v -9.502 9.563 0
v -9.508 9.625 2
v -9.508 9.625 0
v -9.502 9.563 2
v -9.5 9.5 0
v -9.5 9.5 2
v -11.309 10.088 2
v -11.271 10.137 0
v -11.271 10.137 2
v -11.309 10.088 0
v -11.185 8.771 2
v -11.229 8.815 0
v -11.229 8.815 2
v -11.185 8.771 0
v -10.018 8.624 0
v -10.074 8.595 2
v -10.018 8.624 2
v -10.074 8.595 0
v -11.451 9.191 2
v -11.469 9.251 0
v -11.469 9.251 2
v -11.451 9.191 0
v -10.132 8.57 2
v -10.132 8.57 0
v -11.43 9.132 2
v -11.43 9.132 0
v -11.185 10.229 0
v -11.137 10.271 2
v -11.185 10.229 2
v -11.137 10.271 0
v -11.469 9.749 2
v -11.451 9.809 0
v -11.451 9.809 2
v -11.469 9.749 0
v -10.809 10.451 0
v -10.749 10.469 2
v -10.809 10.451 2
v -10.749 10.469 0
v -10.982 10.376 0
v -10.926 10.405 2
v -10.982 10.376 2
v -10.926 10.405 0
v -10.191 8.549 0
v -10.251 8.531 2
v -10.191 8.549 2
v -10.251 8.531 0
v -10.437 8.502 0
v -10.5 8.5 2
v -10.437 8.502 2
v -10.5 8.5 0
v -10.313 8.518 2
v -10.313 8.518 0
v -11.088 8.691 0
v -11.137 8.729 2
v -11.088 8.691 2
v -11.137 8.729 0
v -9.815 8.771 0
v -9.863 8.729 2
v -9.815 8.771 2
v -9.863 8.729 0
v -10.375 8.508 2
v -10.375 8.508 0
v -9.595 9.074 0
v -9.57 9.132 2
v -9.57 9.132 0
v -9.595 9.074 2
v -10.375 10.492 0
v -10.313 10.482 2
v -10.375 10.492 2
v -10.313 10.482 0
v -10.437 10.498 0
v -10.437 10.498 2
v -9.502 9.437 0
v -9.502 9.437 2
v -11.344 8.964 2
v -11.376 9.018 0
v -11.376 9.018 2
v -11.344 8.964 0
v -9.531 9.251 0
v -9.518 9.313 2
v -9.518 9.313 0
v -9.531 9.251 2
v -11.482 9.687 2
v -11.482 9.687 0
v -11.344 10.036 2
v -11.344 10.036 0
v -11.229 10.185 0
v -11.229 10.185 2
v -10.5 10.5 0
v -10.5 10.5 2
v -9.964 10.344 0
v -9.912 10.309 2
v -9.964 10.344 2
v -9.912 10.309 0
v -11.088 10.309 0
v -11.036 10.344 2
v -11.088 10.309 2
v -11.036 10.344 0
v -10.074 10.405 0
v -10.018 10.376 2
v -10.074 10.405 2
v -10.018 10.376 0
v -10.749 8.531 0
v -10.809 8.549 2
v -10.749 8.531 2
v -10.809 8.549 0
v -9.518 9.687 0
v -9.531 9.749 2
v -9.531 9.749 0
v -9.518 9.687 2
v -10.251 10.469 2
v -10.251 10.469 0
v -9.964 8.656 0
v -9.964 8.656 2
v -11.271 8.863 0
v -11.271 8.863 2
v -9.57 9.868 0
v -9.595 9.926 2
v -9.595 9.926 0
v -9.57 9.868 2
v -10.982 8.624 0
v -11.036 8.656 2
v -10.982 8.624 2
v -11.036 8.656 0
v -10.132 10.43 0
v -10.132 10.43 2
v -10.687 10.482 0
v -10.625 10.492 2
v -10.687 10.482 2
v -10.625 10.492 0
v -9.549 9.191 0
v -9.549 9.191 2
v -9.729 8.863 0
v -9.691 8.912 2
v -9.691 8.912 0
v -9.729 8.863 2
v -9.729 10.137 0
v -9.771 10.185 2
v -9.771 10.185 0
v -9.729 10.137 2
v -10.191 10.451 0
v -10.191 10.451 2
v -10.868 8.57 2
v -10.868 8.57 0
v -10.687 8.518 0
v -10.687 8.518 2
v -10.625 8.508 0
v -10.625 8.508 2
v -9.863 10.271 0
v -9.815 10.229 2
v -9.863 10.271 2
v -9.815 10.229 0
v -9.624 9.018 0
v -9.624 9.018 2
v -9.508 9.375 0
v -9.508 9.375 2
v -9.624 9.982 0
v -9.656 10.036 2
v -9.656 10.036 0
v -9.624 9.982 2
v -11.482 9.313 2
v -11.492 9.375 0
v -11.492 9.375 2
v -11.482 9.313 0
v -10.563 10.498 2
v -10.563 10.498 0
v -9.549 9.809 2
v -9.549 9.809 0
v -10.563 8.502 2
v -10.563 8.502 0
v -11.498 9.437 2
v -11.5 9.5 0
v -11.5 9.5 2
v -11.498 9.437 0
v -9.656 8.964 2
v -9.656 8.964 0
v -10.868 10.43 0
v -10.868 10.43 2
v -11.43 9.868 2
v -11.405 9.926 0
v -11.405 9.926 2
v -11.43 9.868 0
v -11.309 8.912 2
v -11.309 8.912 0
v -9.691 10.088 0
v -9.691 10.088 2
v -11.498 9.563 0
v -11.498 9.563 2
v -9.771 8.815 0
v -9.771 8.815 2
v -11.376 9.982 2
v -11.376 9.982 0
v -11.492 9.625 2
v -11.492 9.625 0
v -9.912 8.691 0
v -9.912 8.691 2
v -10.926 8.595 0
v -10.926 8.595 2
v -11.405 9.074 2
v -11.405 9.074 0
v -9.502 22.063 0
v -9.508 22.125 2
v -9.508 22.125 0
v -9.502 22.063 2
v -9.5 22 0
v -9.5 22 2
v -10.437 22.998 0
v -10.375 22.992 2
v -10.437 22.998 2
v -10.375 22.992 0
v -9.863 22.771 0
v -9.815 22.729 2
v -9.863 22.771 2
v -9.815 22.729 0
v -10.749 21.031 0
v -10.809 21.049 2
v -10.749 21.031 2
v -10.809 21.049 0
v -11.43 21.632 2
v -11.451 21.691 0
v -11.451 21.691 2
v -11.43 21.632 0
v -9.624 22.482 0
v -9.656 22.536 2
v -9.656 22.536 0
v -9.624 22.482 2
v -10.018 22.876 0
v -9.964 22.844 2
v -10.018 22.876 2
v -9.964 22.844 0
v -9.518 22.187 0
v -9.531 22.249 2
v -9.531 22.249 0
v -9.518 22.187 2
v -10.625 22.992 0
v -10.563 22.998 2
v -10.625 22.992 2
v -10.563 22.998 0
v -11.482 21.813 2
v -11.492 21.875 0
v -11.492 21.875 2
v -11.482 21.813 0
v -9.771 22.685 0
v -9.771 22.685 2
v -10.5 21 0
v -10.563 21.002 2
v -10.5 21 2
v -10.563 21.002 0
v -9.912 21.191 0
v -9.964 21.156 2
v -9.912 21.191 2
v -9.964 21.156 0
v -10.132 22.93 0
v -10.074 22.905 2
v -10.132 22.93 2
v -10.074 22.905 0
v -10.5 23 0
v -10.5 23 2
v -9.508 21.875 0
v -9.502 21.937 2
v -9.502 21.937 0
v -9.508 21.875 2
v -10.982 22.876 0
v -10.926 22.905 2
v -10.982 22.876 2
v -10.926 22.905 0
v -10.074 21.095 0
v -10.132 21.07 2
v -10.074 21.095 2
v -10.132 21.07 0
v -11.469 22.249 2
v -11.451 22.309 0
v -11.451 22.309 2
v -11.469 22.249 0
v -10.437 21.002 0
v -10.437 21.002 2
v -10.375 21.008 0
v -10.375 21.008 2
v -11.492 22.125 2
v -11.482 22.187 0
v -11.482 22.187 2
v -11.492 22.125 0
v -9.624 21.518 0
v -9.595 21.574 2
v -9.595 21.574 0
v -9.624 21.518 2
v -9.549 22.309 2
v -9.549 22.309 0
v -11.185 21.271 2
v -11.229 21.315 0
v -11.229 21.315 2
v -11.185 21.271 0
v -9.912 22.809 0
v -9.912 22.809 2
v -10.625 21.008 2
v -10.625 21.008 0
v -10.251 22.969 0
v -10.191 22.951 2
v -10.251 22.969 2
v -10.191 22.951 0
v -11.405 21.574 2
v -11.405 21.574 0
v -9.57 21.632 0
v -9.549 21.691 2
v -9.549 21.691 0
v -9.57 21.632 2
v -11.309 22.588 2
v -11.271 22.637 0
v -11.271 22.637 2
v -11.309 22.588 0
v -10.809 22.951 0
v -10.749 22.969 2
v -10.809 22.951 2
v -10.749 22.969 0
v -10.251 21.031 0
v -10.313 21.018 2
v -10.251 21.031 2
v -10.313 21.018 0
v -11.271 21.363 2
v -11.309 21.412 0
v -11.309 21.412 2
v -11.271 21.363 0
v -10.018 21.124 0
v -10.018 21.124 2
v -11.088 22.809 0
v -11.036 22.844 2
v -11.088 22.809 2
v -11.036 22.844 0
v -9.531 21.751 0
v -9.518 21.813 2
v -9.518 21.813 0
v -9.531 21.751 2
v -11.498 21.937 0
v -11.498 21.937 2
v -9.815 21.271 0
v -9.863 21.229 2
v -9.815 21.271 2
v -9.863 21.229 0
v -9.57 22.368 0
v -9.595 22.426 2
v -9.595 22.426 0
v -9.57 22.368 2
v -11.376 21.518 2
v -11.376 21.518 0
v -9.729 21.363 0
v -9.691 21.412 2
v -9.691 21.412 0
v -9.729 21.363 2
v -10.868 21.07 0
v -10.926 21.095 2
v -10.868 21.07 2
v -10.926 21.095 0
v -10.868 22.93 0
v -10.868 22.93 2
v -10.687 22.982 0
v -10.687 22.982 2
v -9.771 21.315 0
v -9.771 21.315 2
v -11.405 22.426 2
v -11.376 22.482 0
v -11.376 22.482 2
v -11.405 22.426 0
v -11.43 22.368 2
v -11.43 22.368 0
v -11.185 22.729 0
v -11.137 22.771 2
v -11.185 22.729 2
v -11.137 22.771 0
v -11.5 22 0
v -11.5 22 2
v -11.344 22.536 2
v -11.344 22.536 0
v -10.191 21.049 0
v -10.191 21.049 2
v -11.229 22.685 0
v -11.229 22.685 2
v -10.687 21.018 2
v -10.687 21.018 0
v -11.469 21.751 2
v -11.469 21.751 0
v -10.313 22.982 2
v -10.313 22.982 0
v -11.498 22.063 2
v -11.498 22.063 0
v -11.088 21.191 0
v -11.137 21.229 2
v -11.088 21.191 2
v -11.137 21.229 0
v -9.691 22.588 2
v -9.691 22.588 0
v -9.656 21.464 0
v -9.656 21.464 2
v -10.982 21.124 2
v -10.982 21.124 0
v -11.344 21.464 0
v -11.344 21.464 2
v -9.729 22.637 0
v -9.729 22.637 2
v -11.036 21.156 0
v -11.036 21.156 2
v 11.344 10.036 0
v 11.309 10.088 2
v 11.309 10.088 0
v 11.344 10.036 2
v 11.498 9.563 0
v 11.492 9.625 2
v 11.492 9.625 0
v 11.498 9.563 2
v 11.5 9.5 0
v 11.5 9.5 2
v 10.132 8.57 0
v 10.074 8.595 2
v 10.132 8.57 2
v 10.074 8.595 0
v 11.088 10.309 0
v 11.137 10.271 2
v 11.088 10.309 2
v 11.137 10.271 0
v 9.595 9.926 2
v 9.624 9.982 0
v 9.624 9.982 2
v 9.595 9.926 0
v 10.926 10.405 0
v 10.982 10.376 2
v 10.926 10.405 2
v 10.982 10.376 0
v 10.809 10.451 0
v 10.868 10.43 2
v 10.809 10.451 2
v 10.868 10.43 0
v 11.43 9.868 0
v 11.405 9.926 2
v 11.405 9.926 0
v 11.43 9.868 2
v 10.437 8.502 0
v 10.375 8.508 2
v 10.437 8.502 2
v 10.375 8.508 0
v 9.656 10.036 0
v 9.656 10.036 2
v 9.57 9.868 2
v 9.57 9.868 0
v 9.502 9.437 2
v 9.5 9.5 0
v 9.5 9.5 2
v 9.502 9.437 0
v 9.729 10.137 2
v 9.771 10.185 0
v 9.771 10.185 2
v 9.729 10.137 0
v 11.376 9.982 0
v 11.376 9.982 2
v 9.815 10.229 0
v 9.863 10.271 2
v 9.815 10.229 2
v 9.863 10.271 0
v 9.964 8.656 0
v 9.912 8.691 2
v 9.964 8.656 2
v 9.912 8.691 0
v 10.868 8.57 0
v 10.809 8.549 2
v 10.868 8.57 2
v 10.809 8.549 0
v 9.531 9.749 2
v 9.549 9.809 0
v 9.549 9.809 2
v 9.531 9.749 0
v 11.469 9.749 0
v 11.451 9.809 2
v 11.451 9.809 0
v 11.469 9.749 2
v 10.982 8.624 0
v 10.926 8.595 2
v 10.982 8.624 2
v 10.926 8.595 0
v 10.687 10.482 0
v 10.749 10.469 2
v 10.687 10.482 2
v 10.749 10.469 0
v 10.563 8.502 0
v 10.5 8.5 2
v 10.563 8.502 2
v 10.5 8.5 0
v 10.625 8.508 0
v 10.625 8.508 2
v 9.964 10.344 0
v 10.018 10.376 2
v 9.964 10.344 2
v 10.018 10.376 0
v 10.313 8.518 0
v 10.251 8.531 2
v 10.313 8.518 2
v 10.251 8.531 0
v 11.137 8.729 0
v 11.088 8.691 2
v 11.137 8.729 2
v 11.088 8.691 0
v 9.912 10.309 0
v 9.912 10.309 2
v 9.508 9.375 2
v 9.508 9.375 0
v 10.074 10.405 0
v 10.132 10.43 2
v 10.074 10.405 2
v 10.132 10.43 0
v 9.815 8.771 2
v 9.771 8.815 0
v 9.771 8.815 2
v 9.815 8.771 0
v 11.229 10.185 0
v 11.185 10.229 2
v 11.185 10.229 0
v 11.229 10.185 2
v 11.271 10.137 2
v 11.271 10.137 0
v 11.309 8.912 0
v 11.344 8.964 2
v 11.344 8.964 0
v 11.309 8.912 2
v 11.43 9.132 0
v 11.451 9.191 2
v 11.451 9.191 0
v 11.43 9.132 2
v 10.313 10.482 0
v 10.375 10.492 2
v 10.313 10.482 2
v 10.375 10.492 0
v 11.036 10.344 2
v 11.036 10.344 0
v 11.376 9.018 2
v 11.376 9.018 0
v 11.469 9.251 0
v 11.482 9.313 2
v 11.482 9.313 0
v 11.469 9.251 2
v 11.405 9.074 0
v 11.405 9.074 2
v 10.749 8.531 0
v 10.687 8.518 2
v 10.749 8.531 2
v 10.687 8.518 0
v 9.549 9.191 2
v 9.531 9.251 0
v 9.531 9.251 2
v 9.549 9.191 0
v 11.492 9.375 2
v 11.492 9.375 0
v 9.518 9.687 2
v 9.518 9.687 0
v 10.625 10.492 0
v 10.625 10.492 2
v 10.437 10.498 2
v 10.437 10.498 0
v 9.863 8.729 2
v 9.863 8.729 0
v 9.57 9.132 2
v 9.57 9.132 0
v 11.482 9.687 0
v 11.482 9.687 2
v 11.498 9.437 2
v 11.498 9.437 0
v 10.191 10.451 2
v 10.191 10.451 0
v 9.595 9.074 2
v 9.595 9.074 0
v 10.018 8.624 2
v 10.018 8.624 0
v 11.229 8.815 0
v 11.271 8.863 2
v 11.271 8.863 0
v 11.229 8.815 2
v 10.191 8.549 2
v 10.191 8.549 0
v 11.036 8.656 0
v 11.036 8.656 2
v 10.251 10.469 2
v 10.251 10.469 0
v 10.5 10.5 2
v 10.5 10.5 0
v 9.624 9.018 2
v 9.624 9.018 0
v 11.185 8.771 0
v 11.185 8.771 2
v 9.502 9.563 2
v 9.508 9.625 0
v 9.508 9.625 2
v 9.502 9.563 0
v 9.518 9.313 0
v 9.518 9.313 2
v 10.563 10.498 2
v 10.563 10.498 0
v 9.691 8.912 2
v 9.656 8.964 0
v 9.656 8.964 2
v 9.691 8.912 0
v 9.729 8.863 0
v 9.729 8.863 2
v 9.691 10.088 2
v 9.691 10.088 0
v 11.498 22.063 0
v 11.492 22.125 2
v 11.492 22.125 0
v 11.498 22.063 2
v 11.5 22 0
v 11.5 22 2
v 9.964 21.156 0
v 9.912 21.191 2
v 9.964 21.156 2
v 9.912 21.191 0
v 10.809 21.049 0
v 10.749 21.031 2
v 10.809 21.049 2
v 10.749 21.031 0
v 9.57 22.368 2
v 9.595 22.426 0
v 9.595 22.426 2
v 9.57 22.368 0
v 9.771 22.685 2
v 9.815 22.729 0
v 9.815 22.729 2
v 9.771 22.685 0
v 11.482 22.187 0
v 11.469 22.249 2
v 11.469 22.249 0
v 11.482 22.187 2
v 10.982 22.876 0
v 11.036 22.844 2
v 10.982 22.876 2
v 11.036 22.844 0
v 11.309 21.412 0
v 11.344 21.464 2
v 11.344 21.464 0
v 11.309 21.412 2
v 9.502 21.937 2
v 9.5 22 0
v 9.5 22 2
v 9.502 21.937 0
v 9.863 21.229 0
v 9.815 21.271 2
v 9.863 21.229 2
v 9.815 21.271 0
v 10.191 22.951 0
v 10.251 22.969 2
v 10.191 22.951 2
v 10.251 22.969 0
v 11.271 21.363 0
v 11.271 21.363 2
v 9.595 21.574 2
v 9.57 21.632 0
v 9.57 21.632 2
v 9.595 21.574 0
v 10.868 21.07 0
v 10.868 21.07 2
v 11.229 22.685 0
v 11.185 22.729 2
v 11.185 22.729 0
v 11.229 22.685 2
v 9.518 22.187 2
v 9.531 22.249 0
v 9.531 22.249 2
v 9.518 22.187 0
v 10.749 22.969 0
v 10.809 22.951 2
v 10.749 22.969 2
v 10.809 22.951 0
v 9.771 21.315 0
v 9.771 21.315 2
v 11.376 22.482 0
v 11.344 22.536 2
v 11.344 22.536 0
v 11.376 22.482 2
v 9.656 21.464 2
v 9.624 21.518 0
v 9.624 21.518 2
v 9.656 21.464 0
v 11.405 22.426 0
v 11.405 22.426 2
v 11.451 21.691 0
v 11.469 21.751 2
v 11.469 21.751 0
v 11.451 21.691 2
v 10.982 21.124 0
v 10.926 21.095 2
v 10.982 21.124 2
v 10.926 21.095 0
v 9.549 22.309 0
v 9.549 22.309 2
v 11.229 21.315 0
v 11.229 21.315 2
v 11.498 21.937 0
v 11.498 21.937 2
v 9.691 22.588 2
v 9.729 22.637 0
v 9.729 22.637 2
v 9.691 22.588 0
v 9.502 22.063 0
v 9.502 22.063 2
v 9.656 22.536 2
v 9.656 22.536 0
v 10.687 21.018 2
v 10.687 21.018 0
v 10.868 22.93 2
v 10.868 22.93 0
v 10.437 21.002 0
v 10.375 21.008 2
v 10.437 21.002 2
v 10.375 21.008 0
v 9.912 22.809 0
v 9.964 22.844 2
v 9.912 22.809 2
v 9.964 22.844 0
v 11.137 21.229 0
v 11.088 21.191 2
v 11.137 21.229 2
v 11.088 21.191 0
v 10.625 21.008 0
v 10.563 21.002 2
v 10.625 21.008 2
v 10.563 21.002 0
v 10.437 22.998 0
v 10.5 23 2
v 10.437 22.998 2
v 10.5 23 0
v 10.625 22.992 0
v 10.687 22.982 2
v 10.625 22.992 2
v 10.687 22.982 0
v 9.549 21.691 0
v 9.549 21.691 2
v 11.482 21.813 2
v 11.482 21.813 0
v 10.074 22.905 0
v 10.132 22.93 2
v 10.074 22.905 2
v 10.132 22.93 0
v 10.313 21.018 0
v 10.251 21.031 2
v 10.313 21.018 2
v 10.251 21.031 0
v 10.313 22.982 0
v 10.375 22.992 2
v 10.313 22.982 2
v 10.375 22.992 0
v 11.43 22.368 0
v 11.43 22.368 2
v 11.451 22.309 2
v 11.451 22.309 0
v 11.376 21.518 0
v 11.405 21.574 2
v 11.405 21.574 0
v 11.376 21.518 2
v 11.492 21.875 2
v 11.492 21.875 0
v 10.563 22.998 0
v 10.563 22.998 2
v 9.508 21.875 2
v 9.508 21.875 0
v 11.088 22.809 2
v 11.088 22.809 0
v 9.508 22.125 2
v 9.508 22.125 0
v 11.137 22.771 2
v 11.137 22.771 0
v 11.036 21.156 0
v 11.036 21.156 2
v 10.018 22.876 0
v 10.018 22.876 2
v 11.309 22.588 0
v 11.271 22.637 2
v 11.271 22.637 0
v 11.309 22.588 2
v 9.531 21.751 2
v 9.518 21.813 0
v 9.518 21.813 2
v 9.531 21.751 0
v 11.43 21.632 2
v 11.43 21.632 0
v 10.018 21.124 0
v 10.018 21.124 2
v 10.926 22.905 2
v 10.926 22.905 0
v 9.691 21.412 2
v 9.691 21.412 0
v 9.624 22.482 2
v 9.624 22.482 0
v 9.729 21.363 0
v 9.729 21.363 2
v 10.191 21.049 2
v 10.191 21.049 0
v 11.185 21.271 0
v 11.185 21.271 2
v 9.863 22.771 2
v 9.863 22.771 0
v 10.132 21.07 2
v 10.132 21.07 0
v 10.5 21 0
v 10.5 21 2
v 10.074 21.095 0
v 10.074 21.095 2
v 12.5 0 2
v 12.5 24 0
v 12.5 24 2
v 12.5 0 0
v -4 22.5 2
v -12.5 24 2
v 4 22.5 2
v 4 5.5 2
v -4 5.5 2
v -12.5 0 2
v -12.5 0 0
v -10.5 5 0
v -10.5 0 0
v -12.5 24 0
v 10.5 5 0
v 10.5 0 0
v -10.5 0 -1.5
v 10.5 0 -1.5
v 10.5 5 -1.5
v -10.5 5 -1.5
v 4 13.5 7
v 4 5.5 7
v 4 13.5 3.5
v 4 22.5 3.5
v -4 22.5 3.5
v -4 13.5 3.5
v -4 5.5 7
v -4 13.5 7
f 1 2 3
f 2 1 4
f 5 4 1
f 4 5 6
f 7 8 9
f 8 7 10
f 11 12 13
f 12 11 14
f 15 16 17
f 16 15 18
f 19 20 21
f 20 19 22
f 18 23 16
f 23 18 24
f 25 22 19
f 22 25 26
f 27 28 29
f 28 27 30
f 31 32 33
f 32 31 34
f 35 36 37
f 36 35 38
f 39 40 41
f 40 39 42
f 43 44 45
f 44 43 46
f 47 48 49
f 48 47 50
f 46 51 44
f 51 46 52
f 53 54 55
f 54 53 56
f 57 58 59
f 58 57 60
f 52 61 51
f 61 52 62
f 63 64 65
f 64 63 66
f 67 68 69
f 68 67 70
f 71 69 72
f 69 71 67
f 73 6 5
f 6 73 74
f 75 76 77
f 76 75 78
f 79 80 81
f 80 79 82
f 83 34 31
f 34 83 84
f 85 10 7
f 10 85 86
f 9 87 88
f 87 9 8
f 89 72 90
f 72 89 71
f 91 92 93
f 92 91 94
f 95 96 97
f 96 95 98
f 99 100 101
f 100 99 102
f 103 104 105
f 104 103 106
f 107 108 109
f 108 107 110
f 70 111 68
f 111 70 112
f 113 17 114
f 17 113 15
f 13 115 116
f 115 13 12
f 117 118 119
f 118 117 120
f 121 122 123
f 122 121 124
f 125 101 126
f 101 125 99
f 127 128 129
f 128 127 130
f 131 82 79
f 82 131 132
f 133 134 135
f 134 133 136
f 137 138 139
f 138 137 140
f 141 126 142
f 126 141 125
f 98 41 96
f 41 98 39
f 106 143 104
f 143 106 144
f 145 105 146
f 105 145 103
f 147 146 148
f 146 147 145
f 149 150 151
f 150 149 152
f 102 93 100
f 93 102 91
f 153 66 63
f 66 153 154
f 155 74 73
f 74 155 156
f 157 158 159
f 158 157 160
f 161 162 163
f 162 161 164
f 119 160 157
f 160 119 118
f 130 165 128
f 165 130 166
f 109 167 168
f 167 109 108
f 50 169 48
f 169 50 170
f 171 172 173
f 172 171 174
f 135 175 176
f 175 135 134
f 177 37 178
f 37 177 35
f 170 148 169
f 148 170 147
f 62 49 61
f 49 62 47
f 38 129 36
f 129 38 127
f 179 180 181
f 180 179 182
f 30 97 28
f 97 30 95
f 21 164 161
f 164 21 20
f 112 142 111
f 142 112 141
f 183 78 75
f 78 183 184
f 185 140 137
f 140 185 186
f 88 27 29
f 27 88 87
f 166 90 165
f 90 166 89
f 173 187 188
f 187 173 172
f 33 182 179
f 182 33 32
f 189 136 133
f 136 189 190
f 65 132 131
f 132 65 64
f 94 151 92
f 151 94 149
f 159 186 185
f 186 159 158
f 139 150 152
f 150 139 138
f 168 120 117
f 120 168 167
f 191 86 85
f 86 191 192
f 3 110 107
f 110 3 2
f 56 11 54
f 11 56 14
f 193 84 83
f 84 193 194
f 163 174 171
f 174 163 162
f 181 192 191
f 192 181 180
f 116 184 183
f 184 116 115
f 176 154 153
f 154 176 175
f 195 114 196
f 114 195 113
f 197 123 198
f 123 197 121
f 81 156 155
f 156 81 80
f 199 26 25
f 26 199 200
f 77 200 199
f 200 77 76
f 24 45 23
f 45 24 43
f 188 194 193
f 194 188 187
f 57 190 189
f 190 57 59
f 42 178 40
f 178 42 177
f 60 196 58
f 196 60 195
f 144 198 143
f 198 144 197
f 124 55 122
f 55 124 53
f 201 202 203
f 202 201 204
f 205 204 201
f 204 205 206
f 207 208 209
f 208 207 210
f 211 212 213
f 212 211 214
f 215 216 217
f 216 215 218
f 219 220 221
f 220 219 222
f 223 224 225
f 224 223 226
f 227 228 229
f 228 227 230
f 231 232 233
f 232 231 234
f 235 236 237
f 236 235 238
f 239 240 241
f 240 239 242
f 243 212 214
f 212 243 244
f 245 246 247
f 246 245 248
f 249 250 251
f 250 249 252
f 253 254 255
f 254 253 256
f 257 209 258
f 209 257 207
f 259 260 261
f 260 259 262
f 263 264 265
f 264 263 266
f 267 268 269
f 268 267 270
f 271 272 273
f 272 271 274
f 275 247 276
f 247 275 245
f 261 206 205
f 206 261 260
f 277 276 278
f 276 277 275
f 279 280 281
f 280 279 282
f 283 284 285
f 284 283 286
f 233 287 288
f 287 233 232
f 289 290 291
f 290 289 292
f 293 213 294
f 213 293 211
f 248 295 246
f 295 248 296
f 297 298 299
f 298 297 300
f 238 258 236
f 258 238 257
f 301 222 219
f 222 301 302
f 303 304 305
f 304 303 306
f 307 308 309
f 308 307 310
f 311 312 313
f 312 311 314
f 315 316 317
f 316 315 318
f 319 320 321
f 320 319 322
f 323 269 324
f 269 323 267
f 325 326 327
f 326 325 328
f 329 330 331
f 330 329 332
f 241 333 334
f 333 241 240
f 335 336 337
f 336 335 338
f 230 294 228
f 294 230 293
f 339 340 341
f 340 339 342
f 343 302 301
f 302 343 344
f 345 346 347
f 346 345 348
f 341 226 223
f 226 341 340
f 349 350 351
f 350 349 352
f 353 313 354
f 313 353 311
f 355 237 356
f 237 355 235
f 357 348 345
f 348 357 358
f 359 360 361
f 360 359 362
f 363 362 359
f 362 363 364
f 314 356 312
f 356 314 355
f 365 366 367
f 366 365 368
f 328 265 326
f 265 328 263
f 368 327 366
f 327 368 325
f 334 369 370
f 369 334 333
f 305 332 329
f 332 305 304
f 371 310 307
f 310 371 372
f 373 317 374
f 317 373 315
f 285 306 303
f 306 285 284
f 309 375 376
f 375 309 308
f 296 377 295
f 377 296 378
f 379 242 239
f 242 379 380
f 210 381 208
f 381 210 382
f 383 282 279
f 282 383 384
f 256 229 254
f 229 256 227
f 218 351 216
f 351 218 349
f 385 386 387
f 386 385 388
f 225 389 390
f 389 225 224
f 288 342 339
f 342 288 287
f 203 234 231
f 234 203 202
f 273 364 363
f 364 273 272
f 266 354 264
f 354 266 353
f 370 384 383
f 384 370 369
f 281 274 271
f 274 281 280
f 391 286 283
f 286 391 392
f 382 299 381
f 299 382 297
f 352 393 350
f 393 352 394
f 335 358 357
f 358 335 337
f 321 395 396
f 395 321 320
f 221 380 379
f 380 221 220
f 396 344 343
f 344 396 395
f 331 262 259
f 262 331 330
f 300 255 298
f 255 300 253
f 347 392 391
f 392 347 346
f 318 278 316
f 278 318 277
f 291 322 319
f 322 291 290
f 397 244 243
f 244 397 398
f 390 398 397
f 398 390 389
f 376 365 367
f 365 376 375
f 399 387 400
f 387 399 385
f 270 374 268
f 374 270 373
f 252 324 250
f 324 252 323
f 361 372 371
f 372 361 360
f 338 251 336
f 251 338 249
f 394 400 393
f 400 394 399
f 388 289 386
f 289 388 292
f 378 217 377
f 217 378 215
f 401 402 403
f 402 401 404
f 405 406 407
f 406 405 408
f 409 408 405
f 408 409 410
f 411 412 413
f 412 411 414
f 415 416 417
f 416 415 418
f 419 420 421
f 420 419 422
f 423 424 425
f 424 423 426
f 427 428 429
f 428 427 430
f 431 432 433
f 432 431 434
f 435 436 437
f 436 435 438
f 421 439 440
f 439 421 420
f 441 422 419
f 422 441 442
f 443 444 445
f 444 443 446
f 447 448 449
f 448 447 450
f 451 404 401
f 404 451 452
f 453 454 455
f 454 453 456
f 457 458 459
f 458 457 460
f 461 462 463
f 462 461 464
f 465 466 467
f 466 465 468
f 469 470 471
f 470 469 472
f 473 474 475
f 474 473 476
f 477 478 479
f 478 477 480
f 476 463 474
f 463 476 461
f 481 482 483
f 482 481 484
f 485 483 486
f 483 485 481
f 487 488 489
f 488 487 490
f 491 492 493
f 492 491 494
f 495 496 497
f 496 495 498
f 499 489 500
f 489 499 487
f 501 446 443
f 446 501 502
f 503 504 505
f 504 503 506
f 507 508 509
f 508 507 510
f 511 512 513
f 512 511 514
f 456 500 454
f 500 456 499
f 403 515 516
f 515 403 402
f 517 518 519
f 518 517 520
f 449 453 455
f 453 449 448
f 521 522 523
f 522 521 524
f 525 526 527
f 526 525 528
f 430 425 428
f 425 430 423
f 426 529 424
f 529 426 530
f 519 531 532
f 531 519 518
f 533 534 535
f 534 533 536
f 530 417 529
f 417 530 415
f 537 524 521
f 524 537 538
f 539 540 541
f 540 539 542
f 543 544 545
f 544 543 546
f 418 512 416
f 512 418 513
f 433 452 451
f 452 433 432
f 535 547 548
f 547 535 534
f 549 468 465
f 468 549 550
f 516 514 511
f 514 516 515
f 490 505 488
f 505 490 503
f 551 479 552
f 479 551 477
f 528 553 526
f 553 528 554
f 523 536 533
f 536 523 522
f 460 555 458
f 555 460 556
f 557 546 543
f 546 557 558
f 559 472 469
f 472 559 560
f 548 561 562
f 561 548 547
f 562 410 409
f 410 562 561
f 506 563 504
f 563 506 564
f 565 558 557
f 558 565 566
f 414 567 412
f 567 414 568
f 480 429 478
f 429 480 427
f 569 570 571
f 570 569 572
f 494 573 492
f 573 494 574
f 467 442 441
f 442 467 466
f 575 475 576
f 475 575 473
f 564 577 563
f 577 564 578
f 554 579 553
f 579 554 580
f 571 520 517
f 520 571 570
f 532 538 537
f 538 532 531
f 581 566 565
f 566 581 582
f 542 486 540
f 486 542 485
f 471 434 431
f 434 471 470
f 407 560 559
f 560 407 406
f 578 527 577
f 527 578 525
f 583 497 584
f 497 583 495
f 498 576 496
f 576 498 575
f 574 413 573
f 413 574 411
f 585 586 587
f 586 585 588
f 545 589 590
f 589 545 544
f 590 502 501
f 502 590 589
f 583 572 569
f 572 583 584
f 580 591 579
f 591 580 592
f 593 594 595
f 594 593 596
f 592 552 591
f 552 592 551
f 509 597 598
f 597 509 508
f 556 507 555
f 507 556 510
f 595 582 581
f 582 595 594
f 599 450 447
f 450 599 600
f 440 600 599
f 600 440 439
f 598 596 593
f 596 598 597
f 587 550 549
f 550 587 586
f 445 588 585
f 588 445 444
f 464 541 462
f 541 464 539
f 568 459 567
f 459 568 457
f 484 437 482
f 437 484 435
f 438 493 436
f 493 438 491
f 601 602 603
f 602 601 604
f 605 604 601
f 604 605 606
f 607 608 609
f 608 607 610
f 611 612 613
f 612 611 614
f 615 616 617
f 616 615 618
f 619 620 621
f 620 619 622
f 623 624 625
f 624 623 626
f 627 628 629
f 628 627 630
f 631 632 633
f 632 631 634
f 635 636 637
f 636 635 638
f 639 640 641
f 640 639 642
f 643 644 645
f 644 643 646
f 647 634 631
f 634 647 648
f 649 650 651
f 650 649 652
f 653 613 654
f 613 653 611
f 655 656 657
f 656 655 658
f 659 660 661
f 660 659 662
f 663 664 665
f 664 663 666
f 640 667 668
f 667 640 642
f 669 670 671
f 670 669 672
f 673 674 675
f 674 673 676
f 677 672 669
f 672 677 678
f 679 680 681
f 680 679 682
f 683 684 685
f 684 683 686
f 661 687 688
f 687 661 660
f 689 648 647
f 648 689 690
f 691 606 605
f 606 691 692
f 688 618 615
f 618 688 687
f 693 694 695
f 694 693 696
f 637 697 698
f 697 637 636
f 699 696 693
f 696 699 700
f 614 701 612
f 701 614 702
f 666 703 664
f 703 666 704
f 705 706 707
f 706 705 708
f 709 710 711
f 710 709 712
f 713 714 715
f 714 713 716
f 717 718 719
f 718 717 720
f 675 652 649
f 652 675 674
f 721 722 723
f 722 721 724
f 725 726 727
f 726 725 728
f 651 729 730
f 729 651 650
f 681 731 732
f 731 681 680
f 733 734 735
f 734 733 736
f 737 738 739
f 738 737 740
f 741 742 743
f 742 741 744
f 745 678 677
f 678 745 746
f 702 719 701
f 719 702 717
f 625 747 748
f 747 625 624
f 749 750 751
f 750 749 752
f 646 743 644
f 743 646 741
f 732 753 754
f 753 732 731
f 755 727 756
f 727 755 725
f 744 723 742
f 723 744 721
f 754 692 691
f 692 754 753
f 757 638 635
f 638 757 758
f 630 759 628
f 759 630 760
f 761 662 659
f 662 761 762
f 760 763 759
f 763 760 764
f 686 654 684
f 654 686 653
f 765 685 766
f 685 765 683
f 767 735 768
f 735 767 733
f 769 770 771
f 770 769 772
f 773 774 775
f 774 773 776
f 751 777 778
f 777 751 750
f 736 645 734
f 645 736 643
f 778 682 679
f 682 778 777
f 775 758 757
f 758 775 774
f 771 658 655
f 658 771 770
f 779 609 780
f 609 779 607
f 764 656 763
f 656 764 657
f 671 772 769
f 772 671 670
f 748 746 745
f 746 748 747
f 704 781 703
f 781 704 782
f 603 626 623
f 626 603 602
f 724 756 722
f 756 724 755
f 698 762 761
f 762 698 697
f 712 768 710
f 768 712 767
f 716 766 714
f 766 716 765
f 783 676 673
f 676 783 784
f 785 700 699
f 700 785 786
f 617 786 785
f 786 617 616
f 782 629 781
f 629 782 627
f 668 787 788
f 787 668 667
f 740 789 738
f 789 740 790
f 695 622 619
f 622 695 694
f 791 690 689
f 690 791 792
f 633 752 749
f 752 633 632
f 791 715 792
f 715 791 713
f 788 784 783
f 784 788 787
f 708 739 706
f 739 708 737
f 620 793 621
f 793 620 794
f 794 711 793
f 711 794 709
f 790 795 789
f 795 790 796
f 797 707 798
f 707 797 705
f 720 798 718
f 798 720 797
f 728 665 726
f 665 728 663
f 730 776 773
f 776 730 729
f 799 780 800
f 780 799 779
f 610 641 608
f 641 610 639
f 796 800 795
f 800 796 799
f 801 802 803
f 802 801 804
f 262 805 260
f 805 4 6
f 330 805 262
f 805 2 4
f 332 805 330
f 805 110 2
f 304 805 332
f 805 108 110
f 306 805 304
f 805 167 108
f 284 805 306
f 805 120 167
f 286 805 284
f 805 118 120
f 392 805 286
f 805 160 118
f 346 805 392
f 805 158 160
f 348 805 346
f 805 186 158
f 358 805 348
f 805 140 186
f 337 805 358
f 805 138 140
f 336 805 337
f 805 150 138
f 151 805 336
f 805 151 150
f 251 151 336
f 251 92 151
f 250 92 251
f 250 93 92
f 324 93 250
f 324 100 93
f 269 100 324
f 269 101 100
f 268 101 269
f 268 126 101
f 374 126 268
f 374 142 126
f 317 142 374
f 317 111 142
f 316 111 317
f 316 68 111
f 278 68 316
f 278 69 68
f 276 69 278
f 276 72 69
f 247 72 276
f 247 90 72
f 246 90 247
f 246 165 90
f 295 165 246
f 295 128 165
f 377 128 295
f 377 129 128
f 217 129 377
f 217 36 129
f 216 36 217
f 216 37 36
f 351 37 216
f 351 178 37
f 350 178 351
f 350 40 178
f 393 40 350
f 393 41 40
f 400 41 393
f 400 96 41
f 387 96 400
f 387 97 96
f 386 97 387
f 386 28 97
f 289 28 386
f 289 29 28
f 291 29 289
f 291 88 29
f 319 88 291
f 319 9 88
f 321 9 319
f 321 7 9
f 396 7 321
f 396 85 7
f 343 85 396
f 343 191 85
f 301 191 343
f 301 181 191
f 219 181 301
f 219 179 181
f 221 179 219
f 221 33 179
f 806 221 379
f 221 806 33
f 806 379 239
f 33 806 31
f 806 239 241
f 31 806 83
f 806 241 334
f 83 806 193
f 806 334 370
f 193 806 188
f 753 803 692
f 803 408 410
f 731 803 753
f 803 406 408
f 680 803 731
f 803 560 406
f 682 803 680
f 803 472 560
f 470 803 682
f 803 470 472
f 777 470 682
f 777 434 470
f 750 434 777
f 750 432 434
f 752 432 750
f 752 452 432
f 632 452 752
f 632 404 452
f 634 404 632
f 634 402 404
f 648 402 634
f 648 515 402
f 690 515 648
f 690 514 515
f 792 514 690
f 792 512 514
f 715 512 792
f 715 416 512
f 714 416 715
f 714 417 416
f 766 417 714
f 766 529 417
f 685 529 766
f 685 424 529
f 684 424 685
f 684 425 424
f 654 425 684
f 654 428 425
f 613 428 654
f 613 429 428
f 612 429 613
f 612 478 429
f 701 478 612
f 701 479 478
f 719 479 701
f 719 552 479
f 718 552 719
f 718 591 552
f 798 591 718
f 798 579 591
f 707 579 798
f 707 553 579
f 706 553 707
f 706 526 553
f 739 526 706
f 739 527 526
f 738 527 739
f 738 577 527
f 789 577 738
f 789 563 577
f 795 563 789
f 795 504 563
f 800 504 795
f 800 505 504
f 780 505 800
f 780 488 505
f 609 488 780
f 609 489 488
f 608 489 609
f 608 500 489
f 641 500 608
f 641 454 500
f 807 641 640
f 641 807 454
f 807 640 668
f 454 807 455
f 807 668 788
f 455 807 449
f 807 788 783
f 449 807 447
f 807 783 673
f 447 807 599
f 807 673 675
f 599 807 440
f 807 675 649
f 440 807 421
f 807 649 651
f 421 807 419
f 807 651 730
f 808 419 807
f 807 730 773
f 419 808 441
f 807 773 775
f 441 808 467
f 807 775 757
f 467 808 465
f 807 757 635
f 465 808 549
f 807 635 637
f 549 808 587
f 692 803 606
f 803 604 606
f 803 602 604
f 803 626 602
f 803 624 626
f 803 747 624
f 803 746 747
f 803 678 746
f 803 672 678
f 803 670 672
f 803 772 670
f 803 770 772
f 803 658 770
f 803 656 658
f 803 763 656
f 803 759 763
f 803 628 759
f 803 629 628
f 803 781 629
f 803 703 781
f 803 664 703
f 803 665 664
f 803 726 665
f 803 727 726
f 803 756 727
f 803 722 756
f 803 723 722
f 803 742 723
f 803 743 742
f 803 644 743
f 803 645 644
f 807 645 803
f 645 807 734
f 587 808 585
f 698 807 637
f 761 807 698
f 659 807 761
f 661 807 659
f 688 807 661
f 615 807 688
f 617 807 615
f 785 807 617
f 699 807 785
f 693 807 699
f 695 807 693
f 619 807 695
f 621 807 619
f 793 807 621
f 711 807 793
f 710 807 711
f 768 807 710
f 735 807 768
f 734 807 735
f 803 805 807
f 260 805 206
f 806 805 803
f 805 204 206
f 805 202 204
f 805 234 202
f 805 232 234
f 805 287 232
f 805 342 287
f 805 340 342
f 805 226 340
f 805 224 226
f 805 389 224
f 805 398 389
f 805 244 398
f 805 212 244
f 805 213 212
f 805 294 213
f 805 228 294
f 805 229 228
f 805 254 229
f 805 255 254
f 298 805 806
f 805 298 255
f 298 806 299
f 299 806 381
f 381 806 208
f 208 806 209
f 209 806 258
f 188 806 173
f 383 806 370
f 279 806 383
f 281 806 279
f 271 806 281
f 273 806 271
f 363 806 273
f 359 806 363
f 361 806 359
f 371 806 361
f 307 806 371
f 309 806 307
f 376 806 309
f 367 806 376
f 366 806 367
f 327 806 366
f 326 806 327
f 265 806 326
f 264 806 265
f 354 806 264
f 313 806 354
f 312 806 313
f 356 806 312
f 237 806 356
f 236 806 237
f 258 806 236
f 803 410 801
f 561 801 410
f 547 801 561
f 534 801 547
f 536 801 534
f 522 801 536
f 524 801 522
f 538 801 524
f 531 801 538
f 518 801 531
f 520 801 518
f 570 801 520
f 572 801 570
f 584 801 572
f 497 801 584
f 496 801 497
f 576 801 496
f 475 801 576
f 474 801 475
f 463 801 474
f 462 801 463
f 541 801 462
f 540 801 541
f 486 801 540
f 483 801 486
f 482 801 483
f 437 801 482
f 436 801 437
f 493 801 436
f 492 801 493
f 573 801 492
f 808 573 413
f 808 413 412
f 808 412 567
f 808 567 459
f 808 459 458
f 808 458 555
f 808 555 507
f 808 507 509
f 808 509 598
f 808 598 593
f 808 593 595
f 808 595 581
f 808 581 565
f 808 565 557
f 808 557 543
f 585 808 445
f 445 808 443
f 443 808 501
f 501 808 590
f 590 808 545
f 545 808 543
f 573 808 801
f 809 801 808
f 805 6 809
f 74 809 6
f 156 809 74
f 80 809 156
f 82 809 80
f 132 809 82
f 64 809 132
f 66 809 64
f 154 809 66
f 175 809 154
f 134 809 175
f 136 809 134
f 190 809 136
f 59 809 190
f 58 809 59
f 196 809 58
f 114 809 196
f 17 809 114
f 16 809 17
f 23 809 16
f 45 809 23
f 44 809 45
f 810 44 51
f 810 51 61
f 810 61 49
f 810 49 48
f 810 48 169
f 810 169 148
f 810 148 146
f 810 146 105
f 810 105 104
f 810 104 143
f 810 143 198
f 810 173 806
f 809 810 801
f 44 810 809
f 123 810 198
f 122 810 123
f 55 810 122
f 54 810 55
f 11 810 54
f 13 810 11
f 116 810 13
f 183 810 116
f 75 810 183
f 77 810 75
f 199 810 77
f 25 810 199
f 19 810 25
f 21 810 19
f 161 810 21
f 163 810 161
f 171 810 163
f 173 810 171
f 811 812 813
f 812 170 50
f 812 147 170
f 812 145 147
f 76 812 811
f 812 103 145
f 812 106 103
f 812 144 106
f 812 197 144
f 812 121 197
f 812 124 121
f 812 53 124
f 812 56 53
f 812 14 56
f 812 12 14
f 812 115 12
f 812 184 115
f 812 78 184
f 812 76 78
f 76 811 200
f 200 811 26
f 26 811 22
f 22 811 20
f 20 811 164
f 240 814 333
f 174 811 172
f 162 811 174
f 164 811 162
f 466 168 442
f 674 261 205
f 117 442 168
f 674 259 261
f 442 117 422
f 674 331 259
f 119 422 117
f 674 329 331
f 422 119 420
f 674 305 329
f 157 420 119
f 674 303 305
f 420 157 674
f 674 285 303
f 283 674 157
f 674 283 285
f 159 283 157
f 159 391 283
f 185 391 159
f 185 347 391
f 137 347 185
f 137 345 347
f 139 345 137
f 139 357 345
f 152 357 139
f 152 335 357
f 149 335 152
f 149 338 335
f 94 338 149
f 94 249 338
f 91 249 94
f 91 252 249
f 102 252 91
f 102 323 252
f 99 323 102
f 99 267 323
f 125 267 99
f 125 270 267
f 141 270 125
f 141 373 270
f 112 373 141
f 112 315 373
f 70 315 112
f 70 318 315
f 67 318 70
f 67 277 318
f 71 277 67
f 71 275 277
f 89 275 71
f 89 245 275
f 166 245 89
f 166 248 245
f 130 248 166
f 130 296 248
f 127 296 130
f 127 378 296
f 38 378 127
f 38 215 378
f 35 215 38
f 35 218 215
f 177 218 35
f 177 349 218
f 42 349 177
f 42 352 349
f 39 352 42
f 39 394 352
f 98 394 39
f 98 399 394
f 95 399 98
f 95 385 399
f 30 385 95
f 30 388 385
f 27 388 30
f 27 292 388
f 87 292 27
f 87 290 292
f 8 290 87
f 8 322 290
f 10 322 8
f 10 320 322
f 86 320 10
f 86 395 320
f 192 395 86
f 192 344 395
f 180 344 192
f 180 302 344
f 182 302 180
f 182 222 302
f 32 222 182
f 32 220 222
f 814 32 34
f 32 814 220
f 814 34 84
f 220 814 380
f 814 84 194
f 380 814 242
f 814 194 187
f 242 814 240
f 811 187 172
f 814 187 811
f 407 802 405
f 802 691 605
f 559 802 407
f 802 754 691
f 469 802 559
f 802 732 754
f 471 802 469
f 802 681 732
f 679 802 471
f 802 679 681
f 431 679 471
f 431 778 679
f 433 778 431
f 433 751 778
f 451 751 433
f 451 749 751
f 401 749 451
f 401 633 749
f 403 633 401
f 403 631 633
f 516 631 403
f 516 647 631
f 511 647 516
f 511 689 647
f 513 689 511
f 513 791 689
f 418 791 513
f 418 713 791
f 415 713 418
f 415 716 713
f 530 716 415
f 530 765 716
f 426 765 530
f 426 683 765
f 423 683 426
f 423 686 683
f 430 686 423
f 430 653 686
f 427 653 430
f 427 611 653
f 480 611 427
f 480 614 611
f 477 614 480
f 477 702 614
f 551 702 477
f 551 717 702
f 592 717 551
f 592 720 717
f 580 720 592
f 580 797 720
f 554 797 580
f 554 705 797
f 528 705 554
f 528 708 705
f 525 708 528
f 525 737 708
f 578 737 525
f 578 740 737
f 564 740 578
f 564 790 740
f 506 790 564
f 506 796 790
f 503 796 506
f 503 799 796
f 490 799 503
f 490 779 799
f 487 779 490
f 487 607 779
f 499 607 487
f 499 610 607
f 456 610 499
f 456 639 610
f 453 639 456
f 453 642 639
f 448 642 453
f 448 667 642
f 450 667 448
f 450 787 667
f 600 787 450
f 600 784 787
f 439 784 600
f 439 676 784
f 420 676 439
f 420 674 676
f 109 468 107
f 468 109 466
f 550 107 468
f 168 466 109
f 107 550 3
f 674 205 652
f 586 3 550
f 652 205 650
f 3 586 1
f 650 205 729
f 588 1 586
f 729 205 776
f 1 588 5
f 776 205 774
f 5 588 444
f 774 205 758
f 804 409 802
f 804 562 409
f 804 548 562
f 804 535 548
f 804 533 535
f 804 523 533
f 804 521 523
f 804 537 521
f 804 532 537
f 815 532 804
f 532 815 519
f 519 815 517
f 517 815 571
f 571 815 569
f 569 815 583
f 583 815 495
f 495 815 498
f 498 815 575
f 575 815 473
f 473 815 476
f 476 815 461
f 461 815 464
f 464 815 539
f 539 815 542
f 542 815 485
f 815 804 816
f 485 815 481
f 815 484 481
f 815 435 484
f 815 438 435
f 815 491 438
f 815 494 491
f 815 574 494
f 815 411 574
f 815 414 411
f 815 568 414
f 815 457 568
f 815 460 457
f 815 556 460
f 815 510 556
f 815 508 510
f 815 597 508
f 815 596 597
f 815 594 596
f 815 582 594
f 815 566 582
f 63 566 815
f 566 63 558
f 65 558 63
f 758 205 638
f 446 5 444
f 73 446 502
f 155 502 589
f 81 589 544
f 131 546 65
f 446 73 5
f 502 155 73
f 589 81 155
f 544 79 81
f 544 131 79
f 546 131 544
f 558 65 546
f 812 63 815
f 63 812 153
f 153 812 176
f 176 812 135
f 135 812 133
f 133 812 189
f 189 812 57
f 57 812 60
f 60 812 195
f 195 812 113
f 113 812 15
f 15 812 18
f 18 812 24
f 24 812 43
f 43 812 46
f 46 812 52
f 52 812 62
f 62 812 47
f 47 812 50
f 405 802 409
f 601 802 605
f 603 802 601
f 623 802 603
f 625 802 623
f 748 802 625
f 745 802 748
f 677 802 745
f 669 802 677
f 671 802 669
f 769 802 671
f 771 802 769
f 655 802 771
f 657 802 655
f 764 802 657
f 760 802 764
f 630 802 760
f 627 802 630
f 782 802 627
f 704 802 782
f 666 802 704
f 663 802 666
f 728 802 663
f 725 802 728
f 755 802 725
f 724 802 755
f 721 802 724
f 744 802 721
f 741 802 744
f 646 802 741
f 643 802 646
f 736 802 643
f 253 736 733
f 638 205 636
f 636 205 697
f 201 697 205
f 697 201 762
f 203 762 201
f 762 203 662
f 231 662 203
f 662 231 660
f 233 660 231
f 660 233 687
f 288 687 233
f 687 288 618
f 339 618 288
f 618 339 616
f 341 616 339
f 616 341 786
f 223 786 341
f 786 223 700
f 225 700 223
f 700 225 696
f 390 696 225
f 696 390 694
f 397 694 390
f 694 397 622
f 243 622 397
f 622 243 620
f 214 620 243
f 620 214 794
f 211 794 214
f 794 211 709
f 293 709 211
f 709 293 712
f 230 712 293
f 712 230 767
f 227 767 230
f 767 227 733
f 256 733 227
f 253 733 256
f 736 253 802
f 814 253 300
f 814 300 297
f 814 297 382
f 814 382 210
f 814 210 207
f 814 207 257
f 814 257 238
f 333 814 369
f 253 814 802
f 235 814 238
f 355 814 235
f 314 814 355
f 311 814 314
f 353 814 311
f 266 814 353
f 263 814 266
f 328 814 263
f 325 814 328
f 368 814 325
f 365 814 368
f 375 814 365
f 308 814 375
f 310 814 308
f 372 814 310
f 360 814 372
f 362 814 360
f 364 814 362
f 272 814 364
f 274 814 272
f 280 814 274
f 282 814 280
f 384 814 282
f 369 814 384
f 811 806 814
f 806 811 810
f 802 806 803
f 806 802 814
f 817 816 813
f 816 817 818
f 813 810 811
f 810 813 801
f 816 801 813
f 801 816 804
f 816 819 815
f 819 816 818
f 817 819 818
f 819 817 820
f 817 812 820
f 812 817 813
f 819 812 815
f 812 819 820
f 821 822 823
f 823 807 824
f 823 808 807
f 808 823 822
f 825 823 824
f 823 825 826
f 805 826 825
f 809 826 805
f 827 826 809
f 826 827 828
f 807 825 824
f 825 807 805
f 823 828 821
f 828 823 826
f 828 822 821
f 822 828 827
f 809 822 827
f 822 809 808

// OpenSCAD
$fn=100;

module rpicam()
{
	// PCB (inklusive Bauteile)
	color("limegreen")
	difference() {
		translate([-25/2,0,0])
			cube([25,24,2]);
		
		translate([0,9.5,0])
		for(x = [-21/2,21/2]) {
			for(y = [0,12.5]) {
				translate([x,y,-1]) {
					cylinder(h=4,d=2);
				}
			}
		}
	}

	// Connector
	color("SaddleBrown")
	translate([-21/2,0,-1.5])
		cube([21,5,2.5]);

	// Camera connector
	color("SaddleBrown")
	translate([-8/2,13.5,2])
		cube([8,9,1.5]);
	// Camera
	color("black")
		translate([-8/2,5.5,2])
			cube([8,8,5]);
}

rpicam();
